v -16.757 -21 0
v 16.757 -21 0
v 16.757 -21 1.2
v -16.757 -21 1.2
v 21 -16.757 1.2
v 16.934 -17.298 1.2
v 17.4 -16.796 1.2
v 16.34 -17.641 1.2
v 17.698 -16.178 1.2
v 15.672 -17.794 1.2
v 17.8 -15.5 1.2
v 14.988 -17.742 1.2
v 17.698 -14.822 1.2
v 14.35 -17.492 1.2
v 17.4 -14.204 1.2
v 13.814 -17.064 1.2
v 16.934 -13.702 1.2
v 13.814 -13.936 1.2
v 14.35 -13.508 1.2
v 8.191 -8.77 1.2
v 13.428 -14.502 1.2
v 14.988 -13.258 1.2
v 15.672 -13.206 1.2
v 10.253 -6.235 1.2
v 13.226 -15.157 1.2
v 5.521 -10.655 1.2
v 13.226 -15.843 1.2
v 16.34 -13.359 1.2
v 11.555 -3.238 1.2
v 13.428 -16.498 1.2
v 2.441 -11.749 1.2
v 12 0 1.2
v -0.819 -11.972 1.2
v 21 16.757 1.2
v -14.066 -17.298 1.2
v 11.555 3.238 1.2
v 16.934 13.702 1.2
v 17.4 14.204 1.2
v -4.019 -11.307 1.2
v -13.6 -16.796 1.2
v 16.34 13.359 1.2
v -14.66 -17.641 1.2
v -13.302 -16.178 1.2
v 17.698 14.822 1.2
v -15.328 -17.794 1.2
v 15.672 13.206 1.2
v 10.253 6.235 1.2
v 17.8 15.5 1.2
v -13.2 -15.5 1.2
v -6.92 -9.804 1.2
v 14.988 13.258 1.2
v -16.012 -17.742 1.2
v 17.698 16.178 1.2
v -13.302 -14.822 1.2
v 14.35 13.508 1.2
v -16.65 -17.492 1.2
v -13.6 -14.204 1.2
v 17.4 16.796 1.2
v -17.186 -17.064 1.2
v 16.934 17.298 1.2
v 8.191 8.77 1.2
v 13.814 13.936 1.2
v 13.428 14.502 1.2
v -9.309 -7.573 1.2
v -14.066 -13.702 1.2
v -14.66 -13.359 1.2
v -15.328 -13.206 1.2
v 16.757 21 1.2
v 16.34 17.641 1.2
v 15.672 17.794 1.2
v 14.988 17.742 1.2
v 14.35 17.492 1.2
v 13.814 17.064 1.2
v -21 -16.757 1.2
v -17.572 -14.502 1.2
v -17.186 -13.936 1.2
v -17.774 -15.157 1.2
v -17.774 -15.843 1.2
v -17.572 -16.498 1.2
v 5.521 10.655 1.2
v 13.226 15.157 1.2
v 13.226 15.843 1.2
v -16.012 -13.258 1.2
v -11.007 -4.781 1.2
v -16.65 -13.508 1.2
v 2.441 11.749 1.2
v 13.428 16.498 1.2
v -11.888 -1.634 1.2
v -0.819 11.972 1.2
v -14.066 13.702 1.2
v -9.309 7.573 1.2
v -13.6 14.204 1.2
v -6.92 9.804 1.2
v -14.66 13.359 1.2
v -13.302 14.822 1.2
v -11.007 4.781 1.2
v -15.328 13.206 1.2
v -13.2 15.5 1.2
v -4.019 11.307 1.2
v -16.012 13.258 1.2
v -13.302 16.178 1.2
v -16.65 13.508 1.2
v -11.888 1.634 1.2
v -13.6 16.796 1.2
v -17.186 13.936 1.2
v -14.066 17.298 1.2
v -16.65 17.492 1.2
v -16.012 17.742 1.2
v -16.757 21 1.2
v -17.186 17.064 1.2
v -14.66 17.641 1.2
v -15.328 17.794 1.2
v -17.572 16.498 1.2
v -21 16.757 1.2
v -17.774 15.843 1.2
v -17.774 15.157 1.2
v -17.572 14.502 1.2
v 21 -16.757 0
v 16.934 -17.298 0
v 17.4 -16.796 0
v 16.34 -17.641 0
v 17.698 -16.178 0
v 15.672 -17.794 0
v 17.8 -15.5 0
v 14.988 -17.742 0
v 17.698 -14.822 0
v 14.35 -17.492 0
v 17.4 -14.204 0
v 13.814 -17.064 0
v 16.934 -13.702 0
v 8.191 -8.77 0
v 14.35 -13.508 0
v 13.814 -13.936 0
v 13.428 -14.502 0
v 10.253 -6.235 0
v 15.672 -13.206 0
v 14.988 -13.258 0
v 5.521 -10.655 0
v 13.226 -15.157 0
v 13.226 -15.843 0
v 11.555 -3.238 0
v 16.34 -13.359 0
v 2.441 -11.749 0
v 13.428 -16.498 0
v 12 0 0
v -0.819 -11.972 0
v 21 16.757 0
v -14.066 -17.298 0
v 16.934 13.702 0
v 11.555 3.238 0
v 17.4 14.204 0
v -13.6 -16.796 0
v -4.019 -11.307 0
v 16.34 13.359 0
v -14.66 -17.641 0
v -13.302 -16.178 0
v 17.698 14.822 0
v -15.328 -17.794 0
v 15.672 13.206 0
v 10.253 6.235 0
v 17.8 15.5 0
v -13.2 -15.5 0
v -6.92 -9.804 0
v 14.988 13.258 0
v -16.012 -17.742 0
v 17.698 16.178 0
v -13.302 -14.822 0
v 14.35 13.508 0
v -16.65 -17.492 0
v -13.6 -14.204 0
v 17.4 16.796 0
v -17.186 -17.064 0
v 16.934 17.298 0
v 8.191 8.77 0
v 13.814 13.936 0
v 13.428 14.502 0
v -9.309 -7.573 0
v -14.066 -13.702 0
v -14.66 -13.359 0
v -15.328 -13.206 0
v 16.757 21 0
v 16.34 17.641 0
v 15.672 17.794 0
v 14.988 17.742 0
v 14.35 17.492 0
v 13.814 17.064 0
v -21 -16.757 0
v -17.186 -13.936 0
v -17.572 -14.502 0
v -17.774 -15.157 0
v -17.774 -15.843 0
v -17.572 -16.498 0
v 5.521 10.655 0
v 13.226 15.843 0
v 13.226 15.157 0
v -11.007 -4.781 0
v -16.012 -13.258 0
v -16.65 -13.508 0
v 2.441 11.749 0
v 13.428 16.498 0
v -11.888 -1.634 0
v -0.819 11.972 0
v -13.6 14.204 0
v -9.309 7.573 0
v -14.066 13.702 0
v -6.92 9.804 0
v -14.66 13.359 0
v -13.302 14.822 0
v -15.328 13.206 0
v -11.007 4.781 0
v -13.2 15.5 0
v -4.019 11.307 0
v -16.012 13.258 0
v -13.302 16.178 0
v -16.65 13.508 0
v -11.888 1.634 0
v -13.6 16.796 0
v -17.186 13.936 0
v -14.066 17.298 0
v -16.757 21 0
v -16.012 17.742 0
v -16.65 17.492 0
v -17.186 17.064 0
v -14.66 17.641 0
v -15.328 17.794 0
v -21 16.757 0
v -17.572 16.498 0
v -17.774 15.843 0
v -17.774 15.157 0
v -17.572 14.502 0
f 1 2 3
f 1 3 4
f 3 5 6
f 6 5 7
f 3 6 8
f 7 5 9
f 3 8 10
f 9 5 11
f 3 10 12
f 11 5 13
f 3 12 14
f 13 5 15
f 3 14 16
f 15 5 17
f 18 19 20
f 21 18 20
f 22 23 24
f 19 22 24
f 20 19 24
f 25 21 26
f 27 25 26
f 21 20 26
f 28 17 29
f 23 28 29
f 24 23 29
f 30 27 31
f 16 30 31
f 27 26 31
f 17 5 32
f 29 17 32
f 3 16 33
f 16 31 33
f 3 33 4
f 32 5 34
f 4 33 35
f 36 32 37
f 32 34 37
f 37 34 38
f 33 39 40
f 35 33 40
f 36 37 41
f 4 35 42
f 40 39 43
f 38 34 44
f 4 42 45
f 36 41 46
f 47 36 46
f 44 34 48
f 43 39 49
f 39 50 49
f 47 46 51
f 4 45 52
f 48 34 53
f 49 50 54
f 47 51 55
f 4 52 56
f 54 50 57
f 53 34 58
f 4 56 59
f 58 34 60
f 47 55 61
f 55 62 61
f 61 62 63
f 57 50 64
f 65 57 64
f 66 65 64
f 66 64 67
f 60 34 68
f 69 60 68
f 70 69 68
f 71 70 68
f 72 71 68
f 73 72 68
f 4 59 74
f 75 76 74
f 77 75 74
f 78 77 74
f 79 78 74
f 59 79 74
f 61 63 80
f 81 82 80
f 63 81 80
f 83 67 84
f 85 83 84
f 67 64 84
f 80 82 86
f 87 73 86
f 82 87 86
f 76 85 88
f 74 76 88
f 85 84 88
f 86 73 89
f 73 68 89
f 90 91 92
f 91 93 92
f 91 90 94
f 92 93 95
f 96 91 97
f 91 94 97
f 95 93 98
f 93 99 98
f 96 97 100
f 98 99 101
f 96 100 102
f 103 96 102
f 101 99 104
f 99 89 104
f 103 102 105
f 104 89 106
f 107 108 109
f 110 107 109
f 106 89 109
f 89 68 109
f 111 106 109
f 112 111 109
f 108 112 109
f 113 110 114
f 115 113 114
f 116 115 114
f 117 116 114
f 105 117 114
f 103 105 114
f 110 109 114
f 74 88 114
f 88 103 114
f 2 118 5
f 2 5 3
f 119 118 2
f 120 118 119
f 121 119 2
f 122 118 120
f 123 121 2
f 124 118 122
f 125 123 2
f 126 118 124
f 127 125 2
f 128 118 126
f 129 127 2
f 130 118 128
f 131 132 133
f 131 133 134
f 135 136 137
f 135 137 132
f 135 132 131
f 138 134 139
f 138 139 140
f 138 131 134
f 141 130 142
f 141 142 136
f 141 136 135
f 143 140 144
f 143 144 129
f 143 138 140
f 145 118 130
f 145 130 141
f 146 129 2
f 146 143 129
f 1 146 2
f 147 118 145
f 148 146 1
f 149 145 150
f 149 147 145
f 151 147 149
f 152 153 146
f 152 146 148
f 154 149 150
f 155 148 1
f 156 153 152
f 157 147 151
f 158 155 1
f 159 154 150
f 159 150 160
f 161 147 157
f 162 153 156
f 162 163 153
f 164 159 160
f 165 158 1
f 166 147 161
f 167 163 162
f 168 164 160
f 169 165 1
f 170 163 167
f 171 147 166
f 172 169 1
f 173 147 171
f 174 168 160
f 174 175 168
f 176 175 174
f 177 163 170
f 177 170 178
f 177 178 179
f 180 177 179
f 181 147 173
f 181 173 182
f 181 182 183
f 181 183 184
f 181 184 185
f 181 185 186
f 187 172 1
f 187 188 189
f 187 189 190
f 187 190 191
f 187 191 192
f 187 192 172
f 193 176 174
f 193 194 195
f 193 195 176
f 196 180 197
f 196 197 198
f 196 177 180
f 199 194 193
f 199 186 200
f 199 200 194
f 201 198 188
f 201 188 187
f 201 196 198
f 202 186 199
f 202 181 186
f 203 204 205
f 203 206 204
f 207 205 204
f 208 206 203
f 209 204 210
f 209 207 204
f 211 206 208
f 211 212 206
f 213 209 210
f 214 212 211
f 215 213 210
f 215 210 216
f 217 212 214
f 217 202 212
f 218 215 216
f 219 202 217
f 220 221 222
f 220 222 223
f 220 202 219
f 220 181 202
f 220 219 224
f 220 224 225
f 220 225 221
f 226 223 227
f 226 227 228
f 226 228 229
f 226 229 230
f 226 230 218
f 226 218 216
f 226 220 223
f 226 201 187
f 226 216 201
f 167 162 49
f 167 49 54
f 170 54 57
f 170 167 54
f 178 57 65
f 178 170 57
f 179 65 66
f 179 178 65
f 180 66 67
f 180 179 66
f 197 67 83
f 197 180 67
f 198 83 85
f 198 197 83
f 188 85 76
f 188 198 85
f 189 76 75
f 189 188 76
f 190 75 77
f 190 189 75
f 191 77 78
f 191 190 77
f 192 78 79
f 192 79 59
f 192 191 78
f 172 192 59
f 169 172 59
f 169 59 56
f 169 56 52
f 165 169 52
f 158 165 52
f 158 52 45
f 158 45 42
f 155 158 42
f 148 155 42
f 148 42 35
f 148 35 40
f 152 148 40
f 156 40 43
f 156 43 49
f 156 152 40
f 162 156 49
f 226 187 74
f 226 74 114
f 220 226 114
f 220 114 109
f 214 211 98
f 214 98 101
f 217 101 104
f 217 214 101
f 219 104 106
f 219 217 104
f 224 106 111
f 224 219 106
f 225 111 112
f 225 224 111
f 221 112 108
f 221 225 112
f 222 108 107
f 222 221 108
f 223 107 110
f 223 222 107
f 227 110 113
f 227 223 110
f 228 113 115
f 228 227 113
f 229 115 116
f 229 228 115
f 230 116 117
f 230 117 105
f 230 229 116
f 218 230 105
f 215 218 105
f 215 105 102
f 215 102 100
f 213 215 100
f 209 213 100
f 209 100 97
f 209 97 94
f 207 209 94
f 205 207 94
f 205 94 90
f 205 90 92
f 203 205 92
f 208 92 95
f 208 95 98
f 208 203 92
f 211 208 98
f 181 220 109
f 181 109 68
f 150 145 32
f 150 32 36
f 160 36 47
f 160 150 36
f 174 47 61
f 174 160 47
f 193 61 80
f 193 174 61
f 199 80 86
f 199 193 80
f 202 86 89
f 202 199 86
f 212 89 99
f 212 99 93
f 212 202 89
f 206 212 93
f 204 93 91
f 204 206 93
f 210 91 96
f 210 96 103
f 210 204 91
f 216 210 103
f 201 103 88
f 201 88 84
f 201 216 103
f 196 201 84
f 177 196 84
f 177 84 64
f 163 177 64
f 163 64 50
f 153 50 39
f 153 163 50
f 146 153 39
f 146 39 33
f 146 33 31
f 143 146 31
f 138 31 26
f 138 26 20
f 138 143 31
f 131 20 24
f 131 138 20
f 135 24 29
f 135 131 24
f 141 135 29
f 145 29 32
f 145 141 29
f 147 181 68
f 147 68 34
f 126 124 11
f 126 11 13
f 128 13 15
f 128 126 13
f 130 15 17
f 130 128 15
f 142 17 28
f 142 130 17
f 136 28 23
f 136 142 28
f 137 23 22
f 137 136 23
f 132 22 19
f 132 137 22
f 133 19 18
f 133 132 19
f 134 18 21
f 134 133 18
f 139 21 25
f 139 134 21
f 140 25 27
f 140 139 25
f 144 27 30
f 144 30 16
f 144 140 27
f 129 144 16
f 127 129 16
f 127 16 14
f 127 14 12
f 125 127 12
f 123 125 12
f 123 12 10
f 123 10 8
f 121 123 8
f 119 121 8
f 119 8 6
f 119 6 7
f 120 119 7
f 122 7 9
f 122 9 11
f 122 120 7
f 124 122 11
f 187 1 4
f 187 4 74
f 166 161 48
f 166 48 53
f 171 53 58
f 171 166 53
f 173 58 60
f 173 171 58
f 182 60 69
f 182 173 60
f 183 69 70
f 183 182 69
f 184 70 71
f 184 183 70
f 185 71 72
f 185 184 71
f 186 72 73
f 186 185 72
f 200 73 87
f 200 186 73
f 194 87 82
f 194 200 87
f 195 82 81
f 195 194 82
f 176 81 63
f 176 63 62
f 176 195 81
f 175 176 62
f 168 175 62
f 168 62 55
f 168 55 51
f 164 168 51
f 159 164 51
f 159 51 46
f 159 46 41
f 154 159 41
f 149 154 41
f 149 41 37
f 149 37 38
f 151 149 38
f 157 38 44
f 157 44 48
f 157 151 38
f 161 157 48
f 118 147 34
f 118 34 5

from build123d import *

# Parameters (mm, degrees)
SKETCH_R   = 2.3
SKETCH_R_2 = 12
PAD_DEPTH  = 1.2


with BuildPart() as part:
    # Sketch → Pad (new body)
    with BuildSketch(Plane.XY):
        Polygon((-16.757359, 21), (16.757359, 21), (21, 16.757359), (21, -16.757359), (16.757359, -21), (-16.757359, -21), (-21, -16.757359), (-21, 16.757359), align=None)
        with Locations((-15.5, 15.5)):
            Circle(SKETCH_R, mode=Mode.SUBTRACT)
        with Locations((15.5, 15.5)):
            Circle(SKETCH_R, mode=Mode.SUBTRACT)
        with Locations((15.5, -15.5)):
            Circle(SKETCH_R, mode=Mode.SUBTRACT)
        with Locations((-15.5, -15.5)):
            Circle(SKETCH_R, mode=Mode.SUBTRACT)
        Circle(SKETCH_R_2, mode=Mode.SUBTRACT)
    extrude(amount=PAD_DEPTH)


solid = part.part
